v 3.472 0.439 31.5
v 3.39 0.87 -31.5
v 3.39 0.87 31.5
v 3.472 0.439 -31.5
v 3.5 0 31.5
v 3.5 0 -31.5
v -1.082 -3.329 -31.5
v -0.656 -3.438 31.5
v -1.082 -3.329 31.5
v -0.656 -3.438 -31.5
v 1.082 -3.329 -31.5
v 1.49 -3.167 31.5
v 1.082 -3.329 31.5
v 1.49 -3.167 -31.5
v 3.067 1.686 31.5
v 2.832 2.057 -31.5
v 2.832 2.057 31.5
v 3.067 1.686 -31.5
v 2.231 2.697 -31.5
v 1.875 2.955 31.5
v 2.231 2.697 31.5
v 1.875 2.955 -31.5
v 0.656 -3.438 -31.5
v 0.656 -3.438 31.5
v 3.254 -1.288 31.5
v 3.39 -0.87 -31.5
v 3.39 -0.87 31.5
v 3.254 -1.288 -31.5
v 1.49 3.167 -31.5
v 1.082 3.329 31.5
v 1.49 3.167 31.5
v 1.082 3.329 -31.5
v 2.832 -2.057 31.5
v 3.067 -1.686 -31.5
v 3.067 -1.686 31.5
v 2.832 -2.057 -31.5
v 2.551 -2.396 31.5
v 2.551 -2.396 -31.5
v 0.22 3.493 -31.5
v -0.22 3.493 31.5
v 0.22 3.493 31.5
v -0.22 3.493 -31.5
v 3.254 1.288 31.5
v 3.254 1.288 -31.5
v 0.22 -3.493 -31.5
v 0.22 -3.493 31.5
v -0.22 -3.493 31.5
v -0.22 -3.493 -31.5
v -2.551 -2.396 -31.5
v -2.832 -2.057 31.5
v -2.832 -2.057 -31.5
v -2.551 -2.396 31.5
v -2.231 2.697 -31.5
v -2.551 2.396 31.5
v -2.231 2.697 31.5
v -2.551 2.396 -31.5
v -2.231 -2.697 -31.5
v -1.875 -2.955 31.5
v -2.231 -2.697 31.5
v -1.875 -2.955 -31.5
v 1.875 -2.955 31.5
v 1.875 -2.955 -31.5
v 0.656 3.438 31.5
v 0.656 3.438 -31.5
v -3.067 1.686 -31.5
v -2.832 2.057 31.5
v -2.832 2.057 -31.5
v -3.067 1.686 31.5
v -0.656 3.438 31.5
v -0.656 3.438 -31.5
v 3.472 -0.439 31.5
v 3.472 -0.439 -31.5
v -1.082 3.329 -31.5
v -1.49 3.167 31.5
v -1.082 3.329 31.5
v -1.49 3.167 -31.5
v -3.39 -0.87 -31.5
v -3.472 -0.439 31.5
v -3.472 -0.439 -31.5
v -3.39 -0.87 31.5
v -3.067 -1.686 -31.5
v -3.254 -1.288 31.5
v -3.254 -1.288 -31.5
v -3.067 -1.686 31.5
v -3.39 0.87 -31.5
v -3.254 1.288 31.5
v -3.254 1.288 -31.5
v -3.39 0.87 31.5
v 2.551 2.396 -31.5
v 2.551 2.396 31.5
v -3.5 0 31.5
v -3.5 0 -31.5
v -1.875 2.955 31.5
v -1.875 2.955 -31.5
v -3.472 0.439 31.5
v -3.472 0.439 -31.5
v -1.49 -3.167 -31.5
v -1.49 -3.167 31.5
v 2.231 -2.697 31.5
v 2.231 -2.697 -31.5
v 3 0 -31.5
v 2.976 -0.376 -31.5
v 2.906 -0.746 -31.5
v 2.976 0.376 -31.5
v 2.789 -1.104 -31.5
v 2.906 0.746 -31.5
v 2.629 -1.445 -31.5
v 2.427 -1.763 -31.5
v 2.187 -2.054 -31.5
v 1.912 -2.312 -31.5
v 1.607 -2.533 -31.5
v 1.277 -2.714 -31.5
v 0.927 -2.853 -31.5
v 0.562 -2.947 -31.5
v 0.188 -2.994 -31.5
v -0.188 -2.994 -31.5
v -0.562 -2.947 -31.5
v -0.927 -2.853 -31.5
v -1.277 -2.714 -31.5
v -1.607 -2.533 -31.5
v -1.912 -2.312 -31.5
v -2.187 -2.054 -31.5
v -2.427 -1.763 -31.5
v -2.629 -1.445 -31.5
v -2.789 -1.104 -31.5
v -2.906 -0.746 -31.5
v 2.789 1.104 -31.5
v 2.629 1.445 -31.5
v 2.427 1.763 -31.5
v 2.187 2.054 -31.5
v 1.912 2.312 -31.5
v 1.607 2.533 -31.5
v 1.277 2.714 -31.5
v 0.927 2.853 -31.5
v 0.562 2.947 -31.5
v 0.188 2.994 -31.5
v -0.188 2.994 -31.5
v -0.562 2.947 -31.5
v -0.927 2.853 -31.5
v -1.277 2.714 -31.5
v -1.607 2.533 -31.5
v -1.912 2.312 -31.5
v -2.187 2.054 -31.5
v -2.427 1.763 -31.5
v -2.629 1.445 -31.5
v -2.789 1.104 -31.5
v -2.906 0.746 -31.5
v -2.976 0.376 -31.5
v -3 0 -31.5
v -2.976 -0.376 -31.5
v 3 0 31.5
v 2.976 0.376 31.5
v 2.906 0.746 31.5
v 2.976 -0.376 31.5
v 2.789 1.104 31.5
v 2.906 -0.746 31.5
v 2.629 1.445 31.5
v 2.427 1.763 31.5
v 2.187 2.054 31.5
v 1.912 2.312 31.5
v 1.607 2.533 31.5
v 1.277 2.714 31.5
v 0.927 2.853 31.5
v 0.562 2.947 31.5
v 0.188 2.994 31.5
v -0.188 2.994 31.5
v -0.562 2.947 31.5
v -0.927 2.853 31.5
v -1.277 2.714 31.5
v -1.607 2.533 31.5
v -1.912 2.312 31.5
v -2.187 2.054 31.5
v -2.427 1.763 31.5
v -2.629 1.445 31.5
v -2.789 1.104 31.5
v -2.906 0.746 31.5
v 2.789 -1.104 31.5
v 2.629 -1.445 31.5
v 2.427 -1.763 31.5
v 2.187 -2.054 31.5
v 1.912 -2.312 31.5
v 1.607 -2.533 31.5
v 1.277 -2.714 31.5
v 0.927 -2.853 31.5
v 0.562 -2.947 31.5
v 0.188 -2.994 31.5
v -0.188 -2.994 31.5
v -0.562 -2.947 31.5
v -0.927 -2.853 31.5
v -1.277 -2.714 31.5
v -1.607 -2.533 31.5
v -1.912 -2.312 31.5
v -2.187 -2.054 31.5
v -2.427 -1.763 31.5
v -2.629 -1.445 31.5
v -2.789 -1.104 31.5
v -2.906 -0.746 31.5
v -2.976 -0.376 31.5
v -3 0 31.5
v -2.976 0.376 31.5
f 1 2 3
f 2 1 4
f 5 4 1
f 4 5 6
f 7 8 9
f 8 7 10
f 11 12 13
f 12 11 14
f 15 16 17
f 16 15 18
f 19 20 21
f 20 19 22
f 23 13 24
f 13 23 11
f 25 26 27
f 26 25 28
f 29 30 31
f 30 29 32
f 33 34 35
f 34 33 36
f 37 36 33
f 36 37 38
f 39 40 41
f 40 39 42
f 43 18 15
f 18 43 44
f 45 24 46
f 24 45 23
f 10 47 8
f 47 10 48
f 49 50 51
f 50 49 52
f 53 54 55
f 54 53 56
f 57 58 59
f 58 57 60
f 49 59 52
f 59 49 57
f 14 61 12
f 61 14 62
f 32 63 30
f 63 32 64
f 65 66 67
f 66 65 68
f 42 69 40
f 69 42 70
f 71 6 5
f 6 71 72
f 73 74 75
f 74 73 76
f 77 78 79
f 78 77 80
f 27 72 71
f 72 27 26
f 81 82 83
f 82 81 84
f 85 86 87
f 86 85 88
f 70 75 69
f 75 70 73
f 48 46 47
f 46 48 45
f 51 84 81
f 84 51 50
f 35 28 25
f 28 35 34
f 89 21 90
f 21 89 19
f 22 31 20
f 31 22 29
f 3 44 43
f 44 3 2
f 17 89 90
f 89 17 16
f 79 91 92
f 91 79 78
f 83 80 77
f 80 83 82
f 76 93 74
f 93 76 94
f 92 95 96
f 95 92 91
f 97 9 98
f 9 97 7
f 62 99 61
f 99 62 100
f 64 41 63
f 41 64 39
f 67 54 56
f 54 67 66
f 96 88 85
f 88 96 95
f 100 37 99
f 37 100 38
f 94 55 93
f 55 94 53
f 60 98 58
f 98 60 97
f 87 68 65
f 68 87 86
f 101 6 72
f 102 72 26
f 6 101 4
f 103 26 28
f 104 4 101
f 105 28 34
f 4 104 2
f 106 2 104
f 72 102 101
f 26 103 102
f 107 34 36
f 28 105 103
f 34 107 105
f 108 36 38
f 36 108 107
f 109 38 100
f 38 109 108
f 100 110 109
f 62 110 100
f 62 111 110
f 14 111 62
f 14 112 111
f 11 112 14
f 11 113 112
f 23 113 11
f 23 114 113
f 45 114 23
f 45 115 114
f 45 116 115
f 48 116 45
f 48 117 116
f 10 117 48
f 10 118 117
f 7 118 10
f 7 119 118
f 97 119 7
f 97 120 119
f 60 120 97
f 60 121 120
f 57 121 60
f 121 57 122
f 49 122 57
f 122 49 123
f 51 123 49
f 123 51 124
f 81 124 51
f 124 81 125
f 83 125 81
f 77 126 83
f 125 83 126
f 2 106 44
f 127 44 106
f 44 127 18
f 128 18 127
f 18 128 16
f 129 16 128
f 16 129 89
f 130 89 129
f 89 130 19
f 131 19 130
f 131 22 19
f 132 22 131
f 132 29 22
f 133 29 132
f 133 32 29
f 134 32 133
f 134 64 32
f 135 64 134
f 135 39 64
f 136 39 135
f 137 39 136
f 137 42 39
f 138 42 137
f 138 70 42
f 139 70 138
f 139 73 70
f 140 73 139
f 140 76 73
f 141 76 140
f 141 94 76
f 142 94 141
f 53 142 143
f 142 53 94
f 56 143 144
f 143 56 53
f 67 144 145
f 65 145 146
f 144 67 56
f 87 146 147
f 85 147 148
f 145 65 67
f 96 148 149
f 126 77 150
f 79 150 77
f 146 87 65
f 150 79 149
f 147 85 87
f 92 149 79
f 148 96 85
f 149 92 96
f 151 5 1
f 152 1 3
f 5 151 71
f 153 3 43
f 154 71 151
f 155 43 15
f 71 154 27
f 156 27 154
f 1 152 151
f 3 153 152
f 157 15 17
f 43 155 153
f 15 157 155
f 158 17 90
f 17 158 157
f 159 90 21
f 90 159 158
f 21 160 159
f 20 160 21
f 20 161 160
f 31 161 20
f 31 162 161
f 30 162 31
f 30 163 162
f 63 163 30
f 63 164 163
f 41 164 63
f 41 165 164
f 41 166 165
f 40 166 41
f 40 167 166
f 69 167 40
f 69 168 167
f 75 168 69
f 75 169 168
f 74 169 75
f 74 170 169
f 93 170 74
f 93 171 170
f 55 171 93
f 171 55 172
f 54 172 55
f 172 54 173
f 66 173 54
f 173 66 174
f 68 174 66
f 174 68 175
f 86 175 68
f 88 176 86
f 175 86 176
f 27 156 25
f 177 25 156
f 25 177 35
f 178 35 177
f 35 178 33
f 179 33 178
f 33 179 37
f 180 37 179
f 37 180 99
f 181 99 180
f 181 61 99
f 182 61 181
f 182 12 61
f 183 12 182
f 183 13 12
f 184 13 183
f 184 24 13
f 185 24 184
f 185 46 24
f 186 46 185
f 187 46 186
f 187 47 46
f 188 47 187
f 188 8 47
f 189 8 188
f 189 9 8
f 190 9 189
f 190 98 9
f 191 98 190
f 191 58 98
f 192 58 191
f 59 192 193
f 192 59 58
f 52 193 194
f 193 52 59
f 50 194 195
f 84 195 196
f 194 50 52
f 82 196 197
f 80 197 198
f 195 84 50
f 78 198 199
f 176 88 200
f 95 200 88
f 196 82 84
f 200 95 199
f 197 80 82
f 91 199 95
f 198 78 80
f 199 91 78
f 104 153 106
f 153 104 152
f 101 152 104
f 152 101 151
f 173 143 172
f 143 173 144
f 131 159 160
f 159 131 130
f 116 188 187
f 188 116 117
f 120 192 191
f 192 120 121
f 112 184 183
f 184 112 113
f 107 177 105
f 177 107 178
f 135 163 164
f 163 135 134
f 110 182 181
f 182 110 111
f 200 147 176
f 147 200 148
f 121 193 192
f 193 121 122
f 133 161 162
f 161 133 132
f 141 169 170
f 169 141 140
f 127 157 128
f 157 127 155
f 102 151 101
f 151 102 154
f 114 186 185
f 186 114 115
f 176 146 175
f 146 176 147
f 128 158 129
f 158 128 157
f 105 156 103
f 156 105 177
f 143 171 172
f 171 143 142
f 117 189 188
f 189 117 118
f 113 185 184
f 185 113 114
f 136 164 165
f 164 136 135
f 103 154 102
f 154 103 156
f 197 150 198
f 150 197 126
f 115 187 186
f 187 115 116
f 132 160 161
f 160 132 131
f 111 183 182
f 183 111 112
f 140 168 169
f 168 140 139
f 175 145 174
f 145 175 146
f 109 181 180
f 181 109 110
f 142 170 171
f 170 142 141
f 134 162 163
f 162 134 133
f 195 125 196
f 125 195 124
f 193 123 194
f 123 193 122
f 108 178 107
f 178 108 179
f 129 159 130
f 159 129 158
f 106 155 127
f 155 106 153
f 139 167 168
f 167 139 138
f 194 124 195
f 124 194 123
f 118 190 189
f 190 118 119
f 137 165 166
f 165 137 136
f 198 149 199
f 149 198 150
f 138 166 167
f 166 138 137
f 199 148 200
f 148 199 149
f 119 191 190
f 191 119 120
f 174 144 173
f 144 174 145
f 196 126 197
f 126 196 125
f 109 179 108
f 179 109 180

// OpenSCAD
$fn = 50;


difference() {
	union() {
		translate(v = [0, 0, -31.5000000000]) {
			cylinder(h = 63, r = 3.5000000000);
		}
	}
	union() {
		translate(v = [0, 0, -100.0000000000]) {
			cylinder(h = 200, r = 3.0000000000);
		}
	}
}
